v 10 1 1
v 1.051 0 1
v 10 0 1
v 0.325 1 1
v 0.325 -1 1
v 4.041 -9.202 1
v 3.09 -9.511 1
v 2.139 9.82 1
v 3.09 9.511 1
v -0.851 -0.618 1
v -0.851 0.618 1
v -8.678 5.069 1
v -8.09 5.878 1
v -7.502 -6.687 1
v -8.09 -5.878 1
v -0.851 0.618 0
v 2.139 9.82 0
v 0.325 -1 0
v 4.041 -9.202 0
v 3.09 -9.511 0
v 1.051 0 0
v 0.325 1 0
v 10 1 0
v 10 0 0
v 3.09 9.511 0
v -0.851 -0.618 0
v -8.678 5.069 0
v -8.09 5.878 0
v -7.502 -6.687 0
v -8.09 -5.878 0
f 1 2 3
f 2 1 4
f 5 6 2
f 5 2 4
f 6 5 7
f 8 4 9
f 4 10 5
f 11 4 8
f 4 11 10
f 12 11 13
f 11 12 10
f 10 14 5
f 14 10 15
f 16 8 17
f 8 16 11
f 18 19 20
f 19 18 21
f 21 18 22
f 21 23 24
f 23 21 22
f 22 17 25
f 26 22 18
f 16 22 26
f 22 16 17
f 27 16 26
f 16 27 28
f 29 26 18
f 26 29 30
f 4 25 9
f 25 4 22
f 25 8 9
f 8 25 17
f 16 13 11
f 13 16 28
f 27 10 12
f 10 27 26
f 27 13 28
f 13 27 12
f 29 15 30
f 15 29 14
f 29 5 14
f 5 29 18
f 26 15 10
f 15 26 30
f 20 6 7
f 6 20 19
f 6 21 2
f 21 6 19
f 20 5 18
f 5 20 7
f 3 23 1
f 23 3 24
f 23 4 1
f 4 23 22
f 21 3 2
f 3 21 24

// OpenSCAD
number=6;

for(i=[1:number])
	rotate((360/5)*i)
		cube([10,1,1]);
